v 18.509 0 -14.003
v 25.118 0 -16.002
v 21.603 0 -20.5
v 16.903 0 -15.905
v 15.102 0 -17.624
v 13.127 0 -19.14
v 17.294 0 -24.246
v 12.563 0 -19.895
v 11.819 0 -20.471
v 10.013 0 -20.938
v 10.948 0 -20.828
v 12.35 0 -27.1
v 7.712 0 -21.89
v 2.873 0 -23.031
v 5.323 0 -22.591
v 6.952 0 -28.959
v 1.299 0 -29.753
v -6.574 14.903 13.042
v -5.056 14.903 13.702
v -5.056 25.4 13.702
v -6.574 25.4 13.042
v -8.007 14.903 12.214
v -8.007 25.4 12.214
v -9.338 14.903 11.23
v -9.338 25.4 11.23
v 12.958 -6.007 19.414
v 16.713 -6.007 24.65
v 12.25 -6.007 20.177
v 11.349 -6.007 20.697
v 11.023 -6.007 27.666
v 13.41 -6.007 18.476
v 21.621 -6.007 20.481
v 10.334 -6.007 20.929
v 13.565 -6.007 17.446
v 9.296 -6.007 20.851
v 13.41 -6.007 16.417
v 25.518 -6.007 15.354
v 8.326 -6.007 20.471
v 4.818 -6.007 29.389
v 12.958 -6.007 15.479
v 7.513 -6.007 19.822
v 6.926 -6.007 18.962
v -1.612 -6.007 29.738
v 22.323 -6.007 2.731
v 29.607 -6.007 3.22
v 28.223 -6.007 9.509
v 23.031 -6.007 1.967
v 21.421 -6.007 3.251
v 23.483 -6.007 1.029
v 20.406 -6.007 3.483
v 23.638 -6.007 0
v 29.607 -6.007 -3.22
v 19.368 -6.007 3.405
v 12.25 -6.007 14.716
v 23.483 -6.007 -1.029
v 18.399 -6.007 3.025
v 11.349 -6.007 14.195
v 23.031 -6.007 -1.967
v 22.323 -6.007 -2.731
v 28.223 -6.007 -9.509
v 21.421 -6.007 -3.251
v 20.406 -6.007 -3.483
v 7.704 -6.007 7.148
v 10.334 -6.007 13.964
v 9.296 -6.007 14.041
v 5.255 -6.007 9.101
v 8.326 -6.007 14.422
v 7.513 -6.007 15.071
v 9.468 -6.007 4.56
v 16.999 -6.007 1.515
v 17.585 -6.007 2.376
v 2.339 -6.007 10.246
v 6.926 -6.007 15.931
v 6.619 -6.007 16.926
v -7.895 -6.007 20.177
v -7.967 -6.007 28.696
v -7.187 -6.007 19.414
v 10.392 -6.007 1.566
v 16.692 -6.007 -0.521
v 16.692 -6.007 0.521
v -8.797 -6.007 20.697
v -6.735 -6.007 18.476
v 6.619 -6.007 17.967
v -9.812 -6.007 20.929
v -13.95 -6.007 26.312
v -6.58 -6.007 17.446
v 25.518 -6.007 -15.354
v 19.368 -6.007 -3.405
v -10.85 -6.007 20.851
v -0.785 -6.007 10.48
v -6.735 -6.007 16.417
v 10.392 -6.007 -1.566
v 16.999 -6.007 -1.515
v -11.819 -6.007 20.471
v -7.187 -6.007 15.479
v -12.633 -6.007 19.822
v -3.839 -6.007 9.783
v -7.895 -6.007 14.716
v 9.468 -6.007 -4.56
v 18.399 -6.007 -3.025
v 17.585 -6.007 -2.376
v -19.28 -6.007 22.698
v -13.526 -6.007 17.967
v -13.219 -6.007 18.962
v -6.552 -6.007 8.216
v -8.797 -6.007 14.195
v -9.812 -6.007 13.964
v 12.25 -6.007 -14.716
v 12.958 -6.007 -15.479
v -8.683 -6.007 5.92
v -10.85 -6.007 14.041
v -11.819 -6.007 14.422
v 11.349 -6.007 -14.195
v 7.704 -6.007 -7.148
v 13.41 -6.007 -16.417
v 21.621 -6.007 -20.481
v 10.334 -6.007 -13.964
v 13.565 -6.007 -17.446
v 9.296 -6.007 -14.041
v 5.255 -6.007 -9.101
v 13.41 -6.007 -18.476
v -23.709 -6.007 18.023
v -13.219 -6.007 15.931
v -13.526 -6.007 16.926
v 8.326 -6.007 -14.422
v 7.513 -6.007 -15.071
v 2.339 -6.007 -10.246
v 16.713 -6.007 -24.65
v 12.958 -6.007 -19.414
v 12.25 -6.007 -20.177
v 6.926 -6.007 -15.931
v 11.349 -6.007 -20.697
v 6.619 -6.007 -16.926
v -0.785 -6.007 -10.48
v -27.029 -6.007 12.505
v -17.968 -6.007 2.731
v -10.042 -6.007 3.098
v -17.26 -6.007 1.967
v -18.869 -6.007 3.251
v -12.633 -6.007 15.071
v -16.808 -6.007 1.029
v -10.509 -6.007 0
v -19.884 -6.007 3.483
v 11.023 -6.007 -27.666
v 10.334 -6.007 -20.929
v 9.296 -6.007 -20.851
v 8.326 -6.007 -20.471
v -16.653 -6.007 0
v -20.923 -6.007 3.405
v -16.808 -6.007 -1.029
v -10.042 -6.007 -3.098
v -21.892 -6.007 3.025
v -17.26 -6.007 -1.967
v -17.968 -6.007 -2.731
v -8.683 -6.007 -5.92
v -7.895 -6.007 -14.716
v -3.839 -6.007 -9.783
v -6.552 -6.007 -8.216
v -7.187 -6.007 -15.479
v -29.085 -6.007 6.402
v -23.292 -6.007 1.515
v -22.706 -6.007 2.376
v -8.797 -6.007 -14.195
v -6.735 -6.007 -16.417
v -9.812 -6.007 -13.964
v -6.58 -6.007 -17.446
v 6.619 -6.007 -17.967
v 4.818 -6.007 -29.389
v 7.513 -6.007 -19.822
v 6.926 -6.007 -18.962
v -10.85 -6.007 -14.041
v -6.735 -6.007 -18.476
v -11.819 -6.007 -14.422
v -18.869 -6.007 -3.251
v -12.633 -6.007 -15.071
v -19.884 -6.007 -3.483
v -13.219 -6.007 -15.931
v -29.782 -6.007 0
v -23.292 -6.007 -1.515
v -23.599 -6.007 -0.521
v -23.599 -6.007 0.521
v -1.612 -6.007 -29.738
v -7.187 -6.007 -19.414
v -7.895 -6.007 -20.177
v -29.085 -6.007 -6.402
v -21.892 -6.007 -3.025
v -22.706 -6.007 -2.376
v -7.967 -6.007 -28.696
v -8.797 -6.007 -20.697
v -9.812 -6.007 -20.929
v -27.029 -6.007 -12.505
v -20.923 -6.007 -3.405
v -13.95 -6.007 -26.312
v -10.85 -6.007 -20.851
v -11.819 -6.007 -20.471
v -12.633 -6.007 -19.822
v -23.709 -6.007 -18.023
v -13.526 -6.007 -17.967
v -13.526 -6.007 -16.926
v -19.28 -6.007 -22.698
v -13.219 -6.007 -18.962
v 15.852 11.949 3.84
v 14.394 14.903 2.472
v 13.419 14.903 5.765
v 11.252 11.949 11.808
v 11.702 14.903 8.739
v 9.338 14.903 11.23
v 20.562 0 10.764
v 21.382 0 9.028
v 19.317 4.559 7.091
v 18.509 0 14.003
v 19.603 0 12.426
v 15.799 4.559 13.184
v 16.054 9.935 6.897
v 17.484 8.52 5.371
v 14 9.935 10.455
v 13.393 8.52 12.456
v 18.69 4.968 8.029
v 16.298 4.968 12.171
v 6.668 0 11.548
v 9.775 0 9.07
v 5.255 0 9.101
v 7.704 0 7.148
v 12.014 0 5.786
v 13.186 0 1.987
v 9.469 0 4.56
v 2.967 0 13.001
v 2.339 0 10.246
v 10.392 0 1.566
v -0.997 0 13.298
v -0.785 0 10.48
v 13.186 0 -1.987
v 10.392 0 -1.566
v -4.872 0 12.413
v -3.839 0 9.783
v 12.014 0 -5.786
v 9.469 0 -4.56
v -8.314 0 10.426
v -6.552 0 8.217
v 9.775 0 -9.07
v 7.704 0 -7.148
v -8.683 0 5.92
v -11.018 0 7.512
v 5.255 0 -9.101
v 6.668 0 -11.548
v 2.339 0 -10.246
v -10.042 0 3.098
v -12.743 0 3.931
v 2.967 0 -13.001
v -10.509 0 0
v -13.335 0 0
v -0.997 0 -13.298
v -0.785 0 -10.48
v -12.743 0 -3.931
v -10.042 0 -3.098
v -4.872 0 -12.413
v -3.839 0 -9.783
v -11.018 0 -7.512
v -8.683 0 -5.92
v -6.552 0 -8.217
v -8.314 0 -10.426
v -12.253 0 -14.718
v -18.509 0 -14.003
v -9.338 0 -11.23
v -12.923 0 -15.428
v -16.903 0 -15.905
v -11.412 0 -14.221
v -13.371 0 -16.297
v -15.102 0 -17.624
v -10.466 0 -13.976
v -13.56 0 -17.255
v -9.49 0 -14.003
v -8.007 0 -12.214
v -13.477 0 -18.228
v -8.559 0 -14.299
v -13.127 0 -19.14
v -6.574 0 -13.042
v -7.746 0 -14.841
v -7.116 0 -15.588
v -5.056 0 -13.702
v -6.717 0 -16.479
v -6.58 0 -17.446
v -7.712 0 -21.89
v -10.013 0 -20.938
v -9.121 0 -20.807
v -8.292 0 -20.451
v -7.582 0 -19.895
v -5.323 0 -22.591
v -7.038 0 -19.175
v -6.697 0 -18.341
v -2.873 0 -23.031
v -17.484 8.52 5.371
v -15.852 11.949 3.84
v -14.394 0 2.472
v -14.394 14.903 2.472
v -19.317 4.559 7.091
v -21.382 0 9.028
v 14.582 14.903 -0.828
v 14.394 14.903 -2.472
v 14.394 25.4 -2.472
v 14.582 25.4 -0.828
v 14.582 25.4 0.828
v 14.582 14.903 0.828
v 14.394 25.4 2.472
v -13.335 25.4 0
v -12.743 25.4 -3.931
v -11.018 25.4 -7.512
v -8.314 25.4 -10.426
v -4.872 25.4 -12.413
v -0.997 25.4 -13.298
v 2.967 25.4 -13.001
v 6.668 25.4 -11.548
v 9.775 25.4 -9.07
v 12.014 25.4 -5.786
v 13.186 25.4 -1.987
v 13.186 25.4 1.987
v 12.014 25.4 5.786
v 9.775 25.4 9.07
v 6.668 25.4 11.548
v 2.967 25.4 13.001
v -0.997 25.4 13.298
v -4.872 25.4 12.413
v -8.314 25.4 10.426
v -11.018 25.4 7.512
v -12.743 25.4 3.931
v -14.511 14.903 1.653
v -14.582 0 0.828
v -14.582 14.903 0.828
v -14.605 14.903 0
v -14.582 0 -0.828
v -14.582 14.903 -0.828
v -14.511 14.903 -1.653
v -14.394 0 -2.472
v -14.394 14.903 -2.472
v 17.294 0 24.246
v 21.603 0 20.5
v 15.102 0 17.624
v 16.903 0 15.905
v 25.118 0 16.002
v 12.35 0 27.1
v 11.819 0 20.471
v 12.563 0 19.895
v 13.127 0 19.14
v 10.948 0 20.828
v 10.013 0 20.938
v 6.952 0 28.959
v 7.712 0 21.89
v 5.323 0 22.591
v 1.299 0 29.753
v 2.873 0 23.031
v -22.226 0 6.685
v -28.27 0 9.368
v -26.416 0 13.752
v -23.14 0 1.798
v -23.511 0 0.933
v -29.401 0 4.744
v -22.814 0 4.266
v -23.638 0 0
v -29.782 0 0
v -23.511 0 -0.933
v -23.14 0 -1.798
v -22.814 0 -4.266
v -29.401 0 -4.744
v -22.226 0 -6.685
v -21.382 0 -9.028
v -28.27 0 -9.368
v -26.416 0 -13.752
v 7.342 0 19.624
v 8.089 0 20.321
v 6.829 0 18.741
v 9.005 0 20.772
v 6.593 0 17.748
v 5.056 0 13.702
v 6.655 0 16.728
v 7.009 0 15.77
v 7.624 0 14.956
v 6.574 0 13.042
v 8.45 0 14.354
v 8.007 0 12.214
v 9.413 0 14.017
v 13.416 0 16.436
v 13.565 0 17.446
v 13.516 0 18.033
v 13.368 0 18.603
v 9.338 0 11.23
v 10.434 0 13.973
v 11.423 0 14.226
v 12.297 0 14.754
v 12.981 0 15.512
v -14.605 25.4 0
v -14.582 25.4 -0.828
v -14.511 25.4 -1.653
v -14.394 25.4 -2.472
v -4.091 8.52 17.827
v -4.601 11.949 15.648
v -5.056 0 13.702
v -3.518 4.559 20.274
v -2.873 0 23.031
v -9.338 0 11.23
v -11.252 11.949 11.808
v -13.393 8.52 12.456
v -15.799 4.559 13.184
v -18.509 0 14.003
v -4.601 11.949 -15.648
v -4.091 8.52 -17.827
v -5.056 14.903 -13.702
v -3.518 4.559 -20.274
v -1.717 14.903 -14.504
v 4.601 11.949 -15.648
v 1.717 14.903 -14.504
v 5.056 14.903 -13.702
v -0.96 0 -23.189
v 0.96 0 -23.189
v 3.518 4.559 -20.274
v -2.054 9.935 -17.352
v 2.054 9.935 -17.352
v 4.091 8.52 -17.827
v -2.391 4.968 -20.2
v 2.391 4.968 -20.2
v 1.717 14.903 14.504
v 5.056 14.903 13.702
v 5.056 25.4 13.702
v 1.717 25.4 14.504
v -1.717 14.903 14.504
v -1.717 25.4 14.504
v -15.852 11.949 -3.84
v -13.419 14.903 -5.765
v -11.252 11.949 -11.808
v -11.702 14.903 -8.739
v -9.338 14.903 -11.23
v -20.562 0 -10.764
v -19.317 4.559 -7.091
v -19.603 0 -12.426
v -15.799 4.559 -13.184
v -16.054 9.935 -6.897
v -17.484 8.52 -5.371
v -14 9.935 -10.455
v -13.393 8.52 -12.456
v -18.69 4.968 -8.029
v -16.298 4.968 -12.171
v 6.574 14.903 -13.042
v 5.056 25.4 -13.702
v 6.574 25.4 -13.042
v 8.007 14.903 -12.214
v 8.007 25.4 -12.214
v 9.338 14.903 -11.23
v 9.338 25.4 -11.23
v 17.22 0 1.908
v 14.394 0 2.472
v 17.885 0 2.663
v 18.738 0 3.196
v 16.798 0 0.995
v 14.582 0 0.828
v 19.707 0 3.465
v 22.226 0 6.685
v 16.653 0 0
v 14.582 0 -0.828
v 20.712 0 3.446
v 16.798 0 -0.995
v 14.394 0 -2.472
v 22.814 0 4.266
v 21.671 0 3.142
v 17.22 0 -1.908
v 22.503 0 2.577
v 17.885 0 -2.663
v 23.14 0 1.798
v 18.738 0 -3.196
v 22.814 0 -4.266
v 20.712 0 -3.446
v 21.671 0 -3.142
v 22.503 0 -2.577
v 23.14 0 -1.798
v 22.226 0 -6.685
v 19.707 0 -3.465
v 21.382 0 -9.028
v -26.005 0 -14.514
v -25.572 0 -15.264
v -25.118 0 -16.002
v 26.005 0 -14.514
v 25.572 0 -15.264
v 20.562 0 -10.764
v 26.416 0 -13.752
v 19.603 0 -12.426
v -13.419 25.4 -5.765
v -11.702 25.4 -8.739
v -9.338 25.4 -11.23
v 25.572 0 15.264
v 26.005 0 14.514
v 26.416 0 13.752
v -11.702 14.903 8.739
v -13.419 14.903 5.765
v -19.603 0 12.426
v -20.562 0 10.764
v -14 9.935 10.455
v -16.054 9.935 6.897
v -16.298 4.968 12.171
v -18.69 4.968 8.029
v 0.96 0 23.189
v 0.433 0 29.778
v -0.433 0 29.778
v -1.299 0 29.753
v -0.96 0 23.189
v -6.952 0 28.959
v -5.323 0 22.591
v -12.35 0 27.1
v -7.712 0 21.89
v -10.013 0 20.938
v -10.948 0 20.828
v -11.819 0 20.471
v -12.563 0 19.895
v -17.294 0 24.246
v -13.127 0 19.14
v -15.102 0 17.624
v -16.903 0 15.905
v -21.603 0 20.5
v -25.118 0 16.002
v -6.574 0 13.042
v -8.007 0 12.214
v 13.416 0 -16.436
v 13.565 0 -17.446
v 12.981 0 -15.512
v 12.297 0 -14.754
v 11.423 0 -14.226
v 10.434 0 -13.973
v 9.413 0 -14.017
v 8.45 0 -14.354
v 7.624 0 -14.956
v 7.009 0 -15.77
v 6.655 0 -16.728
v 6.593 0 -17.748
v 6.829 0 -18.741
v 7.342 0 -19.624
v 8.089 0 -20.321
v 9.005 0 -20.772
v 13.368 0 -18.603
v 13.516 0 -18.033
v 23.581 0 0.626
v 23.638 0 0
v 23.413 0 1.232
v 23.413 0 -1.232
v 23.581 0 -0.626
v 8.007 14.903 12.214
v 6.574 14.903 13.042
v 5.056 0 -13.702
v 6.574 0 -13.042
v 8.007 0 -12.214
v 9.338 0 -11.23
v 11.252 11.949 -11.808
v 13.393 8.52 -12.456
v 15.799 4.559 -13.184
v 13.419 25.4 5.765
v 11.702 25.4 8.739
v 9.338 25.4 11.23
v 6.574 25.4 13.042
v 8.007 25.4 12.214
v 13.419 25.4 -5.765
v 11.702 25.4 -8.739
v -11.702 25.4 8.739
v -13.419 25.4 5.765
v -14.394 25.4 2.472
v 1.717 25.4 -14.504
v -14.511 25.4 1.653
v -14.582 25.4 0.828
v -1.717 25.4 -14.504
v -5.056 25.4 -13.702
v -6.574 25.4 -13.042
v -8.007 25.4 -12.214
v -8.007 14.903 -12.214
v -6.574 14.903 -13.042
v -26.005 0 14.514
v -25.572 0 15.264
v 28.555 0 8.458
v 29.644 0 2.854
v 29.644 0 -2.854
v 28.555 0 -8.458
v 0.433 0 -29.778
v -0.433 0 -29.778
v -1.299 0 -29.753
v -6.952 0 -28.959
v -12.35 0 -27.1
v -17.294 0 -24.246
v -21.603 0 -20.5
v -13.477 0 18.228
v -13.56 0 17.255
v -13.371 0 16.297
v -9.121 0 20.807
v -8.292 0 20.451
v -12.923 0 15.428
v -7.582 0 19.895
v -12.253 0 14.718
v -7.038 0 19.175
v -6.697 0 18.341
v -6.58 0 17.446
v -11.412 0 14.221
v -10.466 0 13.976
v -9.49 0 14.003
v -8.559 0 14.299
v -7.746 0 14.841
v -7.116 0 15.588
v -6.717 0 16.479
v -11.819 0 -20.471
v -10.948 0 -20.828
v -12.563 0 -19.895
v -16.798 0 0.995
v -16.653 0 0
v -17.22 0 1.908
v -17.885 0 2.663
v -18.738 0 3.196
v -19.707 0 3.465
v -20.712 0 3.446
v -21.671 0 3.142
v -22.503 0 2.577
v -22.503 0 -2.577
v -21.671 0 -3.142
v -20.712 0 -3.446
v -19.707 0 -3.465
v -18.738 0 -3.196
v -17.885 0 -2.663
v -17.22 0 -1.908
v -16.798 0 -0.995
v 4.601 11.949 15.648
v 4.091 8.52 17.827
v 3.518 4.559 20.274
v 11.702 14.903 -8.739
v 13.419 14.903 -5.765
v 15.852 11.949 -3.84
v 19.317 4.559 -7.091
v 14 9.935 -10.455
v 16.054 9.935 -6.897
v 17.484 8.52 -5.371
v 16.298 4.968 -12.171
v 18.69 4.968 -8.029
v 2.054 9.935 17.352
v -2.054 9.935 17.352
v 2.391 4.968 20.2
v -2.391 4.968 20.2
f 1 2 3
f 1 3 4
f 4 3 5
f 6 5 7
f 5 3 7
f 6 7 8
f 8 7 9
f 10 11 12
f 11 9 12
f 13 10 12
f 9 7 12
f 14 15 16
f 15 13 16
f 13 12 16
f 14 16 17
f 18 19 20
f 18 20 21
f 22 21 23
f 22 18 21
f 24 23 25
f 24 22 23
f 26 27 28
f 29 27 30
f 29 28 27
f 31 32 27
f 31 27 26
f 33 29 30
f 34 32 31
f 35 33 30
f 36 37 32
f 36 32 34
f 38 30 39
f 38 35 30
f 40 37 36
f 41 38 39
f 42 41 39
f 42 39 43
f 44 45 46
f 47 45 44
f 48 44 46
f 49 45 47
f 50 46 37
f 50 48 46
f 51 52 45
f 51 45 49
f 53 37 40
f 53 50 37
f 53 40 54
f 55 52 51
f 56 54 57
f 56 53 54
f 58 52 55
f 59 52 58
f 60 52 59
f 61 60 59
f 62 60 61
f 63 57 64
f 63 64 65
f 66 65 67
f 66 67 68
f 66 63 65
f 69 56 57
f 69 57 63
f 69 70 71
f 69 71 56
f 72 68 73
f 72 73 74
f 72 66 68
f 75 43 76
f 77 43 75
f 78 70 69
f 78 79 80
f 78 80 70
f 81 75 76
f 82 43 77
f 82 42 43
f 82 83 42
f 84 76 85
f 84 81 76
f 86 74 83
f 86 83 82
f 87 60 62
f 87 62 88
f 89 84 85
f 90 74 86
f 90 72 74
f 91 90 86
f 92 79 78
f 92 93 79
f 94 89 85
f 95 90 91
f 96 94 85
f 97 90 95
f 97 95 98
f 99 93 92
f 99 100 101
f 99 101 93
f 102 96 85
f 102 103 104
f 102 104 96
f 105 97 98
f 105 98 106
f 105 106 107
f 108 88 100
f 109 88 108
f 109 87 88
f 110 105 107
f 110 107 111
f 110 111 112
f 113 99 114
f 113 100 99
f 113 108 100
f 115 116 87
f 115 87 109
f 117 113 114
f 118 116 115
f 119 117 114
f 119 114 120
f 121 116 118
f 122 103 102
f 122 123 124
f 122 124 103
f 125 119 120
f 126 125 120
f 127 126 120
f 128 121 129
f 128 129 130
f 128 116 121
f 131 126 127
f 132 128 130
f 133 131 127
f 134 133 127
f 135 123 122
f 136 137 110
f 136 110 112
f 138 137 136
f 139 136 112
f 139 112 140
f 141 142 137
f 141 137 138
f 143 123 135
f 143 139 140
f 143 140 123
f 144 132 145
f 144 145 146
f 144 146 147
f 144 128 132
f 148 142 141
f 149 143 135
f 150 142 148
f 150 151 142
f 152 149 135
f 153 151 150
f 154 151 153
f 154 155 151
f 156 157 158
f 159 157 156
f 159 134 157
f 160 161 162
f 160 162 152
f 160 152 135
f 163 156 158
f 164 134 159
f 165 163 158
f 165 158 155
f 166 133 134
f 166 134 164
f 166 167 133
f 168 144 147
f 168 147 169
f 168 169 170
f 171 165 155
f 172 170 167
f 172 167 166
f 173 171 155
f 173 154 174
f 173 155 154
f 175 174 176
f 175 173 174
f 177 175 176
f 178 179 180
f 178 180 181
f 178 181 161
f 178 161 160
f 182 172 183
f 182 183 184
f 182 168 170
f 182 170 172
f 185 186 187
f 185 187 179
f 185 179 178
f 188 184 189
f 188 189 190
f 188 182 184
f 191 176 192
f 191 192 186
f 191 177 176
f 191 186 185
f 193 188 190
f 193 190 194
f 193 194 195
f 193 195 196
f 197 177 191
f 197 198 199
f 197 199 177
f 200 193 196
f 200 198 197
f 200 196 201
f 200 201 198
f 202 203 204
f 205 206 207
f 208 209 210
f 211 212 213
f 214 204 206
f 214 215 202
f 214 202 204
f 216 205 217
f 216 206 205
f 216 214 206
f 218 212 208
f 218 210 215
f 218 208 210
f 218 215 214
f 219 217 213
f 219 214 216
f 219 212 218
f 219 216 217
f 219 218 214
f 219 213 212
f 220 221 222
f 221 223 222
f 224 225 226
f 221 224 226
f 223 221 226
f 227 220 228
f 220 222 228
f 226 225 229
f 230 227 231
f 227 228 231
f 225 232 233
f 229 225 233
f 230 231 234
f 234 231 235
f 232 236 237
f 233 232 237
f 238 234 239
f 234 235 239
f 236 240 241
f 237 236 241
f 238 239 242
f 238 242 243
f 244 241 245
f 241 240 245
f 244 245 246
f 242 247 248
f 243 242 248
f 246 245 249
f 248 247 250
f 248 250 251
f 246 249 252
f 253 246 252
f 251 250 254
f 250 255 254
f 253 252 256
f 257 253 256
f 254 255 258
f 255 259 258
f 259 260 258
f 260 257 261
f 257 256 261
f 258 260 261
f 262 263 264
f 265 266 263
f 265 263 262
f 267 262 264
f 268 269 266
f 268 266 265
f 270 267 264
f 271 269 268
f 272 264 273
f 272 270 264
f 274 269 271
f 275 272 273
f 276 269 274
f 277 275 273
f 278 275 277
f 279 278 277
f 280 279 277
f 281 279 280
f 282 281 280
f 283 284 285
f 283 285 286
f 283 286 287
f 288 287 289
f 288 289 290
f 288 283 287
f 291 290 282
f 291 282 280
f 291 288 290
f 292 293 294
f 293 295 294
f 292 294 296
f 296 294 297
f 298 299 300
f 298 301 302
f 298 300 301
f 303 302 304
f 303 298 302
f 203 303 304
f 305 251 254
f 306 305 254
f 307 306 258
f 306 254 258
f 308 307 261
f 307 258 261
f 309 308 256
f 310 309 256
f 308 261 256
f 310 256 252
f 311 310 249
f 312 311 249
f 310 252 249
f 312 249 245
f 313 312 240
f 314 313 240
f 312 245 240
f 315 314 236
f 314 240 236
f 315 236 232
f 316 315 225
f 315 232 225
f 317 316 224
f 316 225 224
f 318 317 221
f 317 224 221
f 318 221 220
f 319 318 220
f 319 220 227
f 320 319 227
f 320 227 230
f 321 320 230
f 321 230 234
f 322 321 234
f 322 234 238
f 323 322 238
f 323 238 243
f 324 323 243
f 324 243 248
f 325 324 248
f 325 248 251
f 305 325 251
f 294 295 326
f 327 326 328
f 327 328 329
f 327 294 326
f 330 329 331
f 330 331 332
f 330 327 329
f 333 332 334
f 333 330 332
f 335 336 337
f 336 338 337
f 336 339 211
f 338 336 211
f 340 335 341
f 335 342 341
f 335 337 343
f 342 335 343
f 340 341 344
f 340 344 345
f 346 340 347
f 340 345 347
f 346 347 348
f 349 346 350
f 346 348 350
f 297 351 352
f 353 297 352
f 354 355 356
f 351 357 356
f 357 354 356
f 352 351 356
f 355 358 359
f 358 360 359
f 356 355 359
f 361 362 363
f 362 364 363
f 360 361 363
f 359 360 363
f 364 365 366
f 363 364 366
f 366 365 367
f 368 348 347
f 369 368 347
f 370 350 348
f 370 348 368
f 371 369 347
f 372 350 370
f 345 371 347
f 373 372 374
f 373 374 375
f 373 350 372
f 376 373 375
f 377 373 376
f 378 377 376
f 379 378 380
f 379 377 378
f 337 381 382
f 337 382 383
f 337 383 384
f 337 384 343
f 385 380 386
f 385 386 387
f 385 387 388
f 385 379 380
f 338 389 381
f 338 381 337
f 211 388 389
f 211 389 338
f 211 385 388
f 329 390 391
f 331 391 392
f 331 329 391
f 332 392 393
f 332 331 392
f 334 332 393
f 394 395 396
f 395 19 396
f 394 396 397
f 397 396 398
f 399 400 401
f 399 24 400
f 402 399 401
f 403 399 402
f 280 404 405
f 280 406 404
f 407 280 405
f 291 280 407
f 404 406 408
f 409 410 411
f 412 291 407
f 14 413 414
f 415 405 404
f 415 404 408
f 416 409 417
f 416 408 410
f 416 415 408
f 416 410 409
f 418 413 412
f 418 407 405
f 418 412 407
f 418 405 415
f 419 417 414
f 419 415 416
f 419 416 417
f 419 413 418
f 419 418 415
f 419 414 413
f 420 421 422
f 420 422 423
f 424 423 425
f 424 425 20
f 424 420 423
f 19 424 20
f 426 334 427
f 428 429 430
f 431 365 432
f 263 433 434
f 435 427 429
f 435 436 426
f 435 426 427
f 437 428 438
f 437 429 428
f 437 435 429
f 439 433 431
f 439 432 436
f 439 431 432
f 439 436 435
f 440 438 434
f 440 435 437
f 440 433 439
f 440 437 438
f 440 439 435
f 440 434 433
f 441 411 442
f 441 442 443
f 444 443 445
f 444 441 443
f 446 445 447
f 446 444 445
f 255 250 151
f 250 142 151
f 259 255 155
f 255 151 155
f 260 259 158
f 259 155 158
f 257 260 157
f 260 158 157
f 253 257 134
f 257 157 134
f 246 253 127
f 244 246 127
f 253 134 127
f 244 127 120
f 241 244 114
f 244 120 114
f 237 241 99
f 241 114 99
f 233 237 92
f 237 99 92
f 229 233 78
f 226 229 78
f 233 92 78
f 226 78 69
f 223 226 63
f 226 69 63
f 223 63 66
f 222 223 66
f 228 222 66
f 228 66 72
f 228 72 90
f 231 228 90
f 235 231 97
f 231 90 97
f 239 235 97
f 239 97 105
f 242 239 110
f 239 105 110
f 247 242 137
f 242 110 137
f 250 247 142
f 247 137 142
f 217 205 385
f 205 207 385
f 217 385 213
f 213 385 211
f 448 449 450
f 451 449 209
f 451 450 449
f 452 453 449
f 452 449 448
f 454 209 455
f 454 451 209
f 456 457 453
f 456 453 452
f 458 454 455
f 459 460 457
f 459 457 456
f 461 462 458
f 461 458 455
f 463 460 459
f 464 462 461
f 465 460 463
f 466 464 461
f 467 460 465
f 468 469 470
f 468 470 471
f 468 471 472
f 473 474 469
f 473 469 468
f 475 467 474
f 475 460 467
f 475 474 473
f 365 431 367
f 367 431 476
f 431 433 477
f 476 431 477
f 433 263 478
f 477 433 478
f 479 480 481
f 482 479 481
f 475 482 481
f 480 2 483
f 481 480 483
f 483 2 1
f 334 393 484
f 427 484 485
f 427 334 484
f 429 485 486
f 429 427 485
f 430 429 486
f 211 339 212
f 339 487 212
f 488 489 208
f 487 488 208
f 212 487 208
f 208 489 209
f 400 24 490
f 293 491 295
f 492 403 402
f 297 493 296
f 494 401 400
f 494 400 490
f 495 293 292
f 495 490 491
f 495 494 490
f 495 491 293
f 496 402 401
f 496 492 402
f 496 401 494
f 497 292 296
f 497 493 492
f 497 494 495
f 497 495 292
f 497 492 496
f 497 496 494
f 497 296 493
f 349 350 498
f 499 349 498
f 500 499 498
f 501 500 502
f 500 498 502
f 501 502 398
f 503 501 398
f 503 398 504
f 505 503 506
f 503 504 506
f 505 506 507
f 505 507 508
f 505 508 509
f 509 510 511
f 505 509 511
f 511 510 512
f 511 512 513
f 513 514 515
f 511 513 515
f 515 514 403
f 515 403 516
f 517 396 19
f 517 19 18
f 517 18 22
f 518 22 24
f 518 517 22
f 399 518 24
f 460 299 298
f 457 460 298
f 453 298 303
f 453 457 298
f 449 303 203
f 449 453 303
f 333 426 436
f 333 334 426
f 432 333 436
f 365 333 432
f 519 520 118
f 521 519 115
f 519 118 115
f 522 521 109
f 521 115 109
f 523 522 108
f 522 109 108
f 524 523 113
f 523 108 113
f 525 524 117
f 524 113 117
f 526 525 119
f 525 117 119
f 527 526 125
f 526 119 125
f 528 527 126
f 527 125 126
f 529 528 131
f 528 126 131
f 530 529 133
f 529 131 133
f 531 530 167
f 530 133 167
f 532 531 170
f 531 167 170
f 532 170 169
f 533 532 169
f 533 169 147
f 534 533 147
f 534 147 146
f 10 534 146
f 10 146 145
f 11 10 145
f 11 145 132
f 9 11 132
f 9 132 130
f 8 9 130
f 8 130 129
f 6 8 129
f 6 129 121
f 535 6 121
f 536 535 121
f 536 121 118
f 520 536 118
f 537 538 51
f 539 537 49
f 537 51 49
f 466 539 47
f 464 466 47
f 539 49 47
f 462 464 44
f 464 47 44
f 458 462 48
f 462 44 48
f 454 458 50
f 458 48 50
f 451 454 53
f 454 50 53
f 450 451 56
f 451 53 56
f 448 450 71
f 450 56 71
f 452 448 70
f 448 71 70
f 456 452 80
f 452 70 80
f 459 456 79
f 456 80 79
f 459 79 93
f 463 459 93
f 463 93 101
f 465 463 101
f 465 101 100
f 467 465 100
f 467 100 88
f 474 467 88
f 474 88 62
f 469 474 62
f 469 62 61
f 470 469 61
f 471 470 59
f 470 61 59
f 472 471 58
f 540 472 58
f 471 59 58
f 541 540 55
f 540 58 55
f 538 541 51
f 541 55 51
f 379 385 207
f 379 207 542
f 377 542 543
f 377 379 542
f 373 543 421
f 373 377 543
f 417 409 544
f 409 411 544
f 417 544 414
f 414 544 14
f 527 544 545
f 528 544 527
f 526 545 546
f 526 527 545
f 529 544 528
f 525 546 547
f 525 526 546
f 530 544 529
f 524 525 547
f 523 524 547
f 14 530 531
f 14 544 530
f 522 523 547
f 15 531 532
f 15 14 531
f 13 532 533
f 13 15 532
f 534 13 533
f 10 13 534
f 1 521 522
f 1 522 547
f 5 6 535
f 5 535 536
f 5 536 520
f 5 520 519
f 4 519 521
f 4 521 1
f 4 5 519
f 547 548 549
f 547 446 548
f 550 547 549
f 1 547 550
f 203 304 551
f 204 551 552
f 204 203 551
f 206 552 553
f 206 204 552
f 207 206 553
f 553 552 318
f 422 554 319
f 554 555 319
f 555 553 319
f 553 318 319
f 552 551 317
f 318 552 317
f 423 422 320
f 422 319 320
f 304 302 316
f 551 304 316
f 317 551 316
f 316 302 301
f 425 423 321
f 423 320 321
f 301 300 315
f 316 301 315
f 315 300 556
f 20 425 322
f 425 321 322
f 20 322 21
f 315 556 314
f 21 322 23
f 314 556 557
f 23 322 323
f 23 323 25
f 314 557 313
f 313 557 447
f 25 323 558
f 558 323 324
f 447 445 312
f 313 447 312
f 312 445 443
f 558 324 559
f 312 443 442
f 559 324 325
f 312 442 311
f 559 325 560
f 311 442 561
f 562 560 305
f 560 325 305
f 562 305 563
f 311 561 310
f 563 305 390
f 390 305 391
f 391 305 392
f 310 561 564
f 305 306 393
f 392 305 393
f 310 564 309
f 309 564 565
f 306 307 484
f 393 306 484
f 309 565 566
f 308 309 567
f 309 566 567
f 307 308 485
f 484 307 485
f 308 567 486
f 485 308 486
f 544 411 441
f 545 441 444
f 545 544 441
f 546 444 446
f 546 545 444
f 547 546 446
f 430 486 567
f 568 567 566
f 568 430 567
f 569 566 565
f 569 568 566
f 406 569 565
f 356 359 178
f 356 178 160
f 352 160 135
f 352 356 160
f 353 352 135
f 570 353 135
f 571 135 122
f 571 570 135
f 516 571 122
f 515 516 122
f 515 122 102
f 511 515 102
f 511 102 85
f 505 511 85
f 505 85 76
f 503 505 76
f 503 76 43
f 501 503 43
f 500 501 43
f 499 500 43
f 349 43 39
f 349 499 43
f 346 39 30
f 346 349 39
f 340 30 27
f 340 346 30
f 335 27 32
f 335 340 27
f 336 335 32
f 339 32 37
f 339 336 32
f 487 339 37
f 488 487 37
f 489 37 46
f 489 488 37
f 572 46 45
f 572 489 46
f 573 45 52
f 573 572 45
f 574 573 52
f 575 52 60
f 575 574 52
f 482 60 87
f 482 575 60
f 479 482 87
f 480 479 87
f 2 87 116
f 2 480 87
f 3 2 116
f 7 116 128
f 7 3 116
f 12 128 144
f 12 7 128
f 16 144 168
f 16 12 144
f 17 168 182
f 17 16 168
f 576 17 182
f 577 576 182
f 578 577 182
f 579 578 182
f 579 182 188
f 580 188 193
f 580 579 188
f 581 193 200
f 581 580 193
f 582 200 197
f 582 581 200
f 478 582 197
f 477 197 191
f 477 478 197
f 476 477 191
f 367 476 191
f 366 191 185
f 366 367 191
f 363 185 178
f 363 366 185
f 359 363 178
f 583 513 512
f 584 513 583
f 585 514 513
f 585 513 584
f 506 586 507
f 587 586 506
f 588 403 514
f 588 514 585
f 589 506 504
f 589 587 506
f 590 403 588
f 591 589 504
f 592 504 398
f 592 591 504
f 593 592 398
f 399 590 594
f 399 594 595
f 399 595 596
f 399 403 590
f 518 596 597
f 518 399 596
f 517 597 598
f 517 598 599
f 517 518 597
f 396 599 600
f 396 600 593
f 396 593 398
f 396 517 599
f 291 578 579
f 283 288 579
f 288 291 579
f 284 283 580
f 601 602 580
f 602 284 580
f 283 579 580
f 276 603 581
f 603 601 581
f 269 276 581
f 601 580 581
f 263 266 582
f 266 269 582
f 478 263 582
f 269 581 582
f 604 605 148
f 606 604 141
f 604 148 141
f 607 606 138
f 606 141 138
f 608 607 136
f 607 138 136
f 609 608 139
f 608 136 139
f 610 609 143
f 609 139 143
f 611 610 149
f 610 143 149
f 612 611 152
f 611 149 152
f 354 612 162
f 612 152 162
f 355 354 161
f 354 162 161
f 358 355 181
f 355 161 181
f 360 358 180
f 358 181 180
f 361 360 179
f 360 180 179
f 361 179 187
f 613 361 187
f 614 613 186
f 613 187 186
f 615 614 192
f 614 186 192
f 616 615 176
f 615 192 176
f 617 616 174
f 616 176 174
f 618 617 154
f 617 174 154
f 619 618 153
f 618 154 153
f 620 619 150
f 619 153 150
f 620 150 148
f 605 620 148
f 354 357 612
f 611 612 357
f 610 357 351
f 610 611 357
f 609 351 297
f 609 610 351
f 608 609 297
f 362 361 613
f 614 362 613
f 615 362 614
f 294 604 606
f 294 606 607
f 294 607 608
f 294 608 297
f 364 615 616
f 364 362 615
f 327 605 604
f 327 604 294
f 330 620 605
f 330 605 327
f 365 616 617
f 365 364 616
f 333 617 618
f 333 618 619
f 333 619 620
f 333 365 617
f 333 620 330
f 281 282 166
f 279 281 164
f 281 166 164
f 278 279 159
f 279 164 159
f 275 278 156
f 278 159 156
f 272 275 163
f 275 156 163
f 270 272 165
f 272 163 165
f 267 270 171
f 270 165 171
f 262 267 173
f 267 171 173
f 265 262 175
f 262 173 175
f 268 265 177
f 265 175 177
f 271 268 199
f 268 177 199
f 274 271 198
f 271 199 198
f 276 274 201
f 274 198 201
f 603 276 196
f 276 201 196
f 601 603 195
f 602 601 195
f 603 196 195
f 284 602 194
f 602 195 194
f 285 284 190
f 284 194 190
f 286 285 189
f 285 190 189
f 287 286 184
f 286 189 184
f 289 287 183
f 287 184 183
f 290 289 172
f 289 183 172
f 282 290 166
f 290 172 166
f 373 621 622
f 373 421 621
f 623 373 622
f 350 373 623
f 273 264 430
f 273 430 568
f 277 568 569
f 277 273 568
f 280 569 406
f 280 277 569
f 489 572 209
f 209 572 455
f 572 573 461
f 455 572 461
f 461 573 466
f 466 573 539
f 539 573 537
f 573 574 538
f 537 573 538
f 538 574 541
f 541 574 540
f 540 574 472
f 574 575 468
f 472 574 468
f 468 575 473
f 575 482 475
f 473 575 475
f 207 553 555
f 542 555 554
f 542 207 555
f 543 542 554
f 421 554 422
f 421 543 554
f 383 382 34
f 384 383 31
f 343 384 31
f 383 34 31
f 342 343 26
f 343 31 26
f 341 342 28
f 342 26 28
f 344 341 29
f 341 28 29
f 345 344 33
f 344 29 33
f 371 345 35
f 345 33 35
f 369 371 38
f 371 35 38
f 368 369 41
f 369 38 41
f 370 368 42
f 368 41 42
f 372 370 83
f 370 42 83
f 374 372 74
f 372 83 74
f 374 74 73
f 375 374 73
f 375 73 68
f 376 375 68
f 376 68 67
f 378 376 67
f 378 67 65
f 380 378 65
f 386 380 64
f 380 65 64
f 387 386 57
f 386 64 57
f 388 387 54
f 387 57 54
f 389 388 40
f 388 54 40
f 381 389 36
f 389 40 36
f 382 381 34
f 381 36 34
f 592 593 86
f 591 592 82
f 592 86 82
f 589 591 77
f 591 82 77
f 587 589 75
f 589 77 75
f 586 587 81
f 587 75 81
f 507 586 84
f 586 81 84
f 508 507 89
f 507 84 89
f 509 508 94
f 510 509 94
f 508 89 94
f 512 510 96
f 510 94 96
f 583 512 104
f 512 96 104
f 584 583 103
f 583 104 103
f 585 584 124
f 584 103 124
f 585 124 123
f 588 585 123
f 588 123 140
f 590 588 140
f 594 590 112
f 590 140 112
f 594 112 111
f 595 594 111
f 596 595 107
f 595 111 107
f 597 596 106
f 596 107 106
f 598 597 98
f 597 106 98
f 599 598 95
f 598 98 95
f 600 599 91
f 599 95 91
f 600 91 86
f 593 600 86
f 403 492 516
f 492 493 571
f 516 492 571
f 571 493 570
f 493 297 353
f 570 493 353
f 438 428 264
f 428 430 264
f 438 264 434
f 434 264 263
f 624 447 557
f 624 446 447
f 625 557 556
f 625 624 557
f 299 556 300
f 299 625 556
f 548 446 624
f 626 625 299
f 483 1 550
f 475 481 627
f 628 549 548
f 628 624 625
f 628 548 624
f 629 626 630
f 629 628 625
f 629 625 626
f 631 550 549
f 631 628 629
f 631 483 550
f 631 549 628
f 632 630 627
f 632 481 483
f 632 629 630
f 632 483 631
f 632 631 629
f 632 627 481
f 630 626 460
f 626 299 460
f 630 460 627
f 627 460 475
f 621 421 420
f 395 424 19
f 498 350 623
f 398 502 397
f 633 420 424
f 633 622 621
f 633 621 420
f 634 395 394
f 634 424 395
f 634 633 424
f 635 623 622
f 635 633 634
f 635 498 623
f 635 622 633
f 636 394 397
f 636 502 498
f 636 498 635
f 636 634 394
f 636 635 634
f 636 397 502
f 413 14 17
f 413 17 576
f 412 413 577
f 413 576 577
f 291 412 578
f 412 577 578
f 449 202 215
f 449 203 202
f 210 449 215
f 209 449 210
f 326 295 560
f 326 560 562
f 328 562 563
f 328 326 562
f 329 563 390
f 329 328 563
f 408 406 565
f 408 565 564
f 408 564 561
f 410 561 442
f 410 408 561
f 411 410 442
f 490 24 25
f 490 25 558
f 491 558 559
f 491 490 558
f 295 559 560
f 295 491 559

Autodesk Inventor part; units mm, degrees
ref_plane "YZ Plane" through (0, 0, 0) normal (1, 0, 0) x (0, 1, 0)
ref_plane "XZ Plane" through (0, 0, 0) normal (0, 1, 0) x (-1, 0, 0)
ref_plane "XY Plane" through (0, 0, 0) normal (0, 0, 1) x (1, 0, 0)
sketch "Sketch1" plane through (0, 0, 0) normal (0, 0, 1) x (1, 0, 0)
  line L0 (0, 52.767) -> (0, -45.7542)
  line L1 (-13.335, 25.4) -> (-13.335, 0)
  line L2 (-10.5093, 0) -> (-10.5092, -6.0071)
  line L3 (-13.335, 0) -> (-10.5093, 0)
  line L4 (-13.335, 25.4) -> (-14.605, 25.4)
  line L5 (-14.605, 25.4) -> (-14.605, 14.903)
  line L6 (-10.5092, -6.0071) -> (-29.7815, -6.0071)
  line L7 (-29.7815, -6.0071) -> (-29.7815, 0)
  line L8 (-29.7815, 0) -> (-23.2093, 0)
  line L9 (-23.2093, 0) -> (-14.605, 14.903)
  point P0 (0, 0)
  dimension "d0" = 25.4
  dimension "d1" = 26.67
  dimension "d2" = 6.0071
  dimension "d3" = 21.0185
  dimension "d4" = 1.27
  dimension "d5" = 19.2722
  dimension "d6" = 6.5723
  dimension "d7" = 30
revolve "Revolution1" add sketch "Sketch1" angle 360 about axis through (0, 52.767, 0) along (0, -1, 0)
sketch "Sketch2" plane through (0, -6.0071, 0) normal (0, -1, 0) x (1, 0, 0)
  circle A0 centre (0, 0) radius 10.5093
  circle A1 centre (0, 0) radius 10.5092 projected
  circle A2 centre (0, 0) radius 29.7815
  circle A3 centre (0, 0) radius 20.1454
  circle A4 centre (0, 0) radius 29.7815 projected
  line L0 (29.7815, 0) -> (20.1454, 0)
  line L1 (-10.5093, 0) -> (-20.1454, 0)
  circle A5 centre (20.1454, 0) radius 3.4925
  circle A6 centre (10.0727, 17.4464) radius 3.4925
  circle A7 centre (-10.0727, 17.4464) radius 3.4925
  circle A8 centre (-20.1454, 0) radius 3.4925
  circle A9 centre (-10.0727, -17.4464) radius 3.4925
  circle A10 centre (10.0727, -17.4464) radius 3.4925
  point P0 (0, 0)
  dimension "d10" = 6.985
  dimension "d13" = 360
extrude "Extrusion1" cut sketch "Sketch2" against normal through all contours A8 A3 L1 | L1 A3 A8 | A3 A8 | A7 A3 | A3 A7 | A9 A3 | A3 A9 | A6 A3 | A3 A6 | A10 A3 | A3 A10 | A5 L0 A3 | A3 A5 | A3 L0 A5
sketch "Sketch3" plane through (0, 0, 0) normal (0, 1, 0) x (1, 0, 0)
  circle A0 centre (0, 0) radius 29.7815 projected
  arc A1 (26.4165, -13.7516) -> (26.4165, 13.7516) centre (0, 0) ccw
  line L0 (14.3942, 2.4722) -> (26.4165, 13.7516)
  line L1 (14.3942, -2.4722) -> (26.4165, -13.7516)
  circle A2 centre (0, 0) radius 14.605 projected
  arc A3 (14.3942, -2.4722) -> (14.3942, 2.4722) centre (0, 0) ccw
  arc A4 (25.1175, 16.0016) -> (1.2991, 29.7532) centre (0, 0) ccw
  line L2 (5.0561, 13.7019) -> (1.2991, 29.7532)
  line L3 (9.3381, 11.2297) -> (25.1175, 16.0016)
  arc A5 (9.3381, 11.2297) -> (5.0561, 13.7019) centre (0, 0) ccw
  arc A6 (-1.2991, 29.7532) -> (-25.1175, 16.0016) centre (0, 0) ccw
  line L4 (-9.3381, 11.2297) -> (-25.1175, 16.0016)
  line L5 (-5.0561, 13.7019) -> (-1.2991, 29.7532)
  arc A7 (-5.0561, 13.7019) -> (-9.3381, 11.2297) centre (0, 0) ccw
  arc A8 (-26.4165, 13.7516) -> (-26.4165, -13.7516) centre (0, 0) ccw
  line L6 (-14.3942, -2.4722) -> (-26.4165, -13.7516)
  line L7 (-14.3942, 2.4722) -> (-26.4165, 13.7516)
  arc A9 (-14.3942, 2.4722) -> (-14.3942, -2.4722) centre (0, 0) ccw
  arc A10 (-25.1175, -16.0016) -> (-1.2991, -29.7532) centre (0, 0) ccw
  line L8 (-5.0561, -13.7019) -> (-1.2991, -29.7532)
  line L9 (-9.3381, -11.2297) -> (-25.1175, -16.0016)
  arc A11 (-9.3381, -11.2297) -> (-5.0561, -13.7019) centre (0, 0) ccw
  arc A12 (1.2991, -29.7532) -> (25.1175, -16.0016) centre (0, 0) ccw
  line L10 (9.3381, -11.2297) -> (25.1175, -16.0016)
  line L11 (5.0561, -13.7019) -> (1.2991, -29.7532)
  arc A13 (5.0561, -13.7019) -> (9.3381, -11.2297) centre (0, 0) ccw
  line L12 (-2.8655, 0) -> (7.3025, 0)
  point P0 (23.1395, -1.798)
  point P1 (23.1395, 1.798)
  point P2 (19.5399, 3.4396)
  point P3 (19.5399, -3.4396)
  point P4 (13.1269, 19.1404)
  point P5 (10.0126, 20.9384)
  point P6 (-10.0126, 20.9384)
  point P7 (-13.1269, 19.1404)
  point P8 (-23.1395, 1.798)
  point P9 (-23.1395, -1.798)
  point P10 (-13.1269, -19.1404)
  point P11 (-10.0126, -20.9384)
  point P12 (10.0126, -20.9384)
  point P13 (13.1269, -19.1404)
  point P14 (-5.0561, 13.7019)
  point P15 (-1.2991, 29.7532)
  point P16 (-25.1175, 16.0016)
  point P17 (-9.3381, 11.2297)
  point P18 (-14.3942, 2.4722)
  point P19 (-26.4165, 13.7516)
  point P20 (-26.4165, -13.7516)
  point P21 (-14.3942, -2.4722)
  point P22 (-9.3381, -11.2297)
  point P23 (-25.1175, -16.0016)
  point P24 (-1.2991, -29.7532)
  point P25 (-5.0561, -13.7019)
  point P26 (5.0561, -13.7019)
  point P27 (1.2991, -29.7532)
  point P28 (25.1175, -16.0016)
  point P29 (9.3381, -11.2297)
  point P30 (9.3381, 11.2297)
  point P31 (1.2991, 29.7532)
  point P32 (5.0561, 13.7019)
  dimension "d21" = 360
  dimension "d23" = 55
extrude "Extrusion2" cut sketch "Sketch3" along normal blind 25.4 contours A0 L1 A2 L0 | L3 A2 L2 A0 | A0 L11 A2 L10 | L5 A2 L4 A0 | A0 L9 A2 L8 | L7 A2 L6 A0
properties part number "Connector_ring"
